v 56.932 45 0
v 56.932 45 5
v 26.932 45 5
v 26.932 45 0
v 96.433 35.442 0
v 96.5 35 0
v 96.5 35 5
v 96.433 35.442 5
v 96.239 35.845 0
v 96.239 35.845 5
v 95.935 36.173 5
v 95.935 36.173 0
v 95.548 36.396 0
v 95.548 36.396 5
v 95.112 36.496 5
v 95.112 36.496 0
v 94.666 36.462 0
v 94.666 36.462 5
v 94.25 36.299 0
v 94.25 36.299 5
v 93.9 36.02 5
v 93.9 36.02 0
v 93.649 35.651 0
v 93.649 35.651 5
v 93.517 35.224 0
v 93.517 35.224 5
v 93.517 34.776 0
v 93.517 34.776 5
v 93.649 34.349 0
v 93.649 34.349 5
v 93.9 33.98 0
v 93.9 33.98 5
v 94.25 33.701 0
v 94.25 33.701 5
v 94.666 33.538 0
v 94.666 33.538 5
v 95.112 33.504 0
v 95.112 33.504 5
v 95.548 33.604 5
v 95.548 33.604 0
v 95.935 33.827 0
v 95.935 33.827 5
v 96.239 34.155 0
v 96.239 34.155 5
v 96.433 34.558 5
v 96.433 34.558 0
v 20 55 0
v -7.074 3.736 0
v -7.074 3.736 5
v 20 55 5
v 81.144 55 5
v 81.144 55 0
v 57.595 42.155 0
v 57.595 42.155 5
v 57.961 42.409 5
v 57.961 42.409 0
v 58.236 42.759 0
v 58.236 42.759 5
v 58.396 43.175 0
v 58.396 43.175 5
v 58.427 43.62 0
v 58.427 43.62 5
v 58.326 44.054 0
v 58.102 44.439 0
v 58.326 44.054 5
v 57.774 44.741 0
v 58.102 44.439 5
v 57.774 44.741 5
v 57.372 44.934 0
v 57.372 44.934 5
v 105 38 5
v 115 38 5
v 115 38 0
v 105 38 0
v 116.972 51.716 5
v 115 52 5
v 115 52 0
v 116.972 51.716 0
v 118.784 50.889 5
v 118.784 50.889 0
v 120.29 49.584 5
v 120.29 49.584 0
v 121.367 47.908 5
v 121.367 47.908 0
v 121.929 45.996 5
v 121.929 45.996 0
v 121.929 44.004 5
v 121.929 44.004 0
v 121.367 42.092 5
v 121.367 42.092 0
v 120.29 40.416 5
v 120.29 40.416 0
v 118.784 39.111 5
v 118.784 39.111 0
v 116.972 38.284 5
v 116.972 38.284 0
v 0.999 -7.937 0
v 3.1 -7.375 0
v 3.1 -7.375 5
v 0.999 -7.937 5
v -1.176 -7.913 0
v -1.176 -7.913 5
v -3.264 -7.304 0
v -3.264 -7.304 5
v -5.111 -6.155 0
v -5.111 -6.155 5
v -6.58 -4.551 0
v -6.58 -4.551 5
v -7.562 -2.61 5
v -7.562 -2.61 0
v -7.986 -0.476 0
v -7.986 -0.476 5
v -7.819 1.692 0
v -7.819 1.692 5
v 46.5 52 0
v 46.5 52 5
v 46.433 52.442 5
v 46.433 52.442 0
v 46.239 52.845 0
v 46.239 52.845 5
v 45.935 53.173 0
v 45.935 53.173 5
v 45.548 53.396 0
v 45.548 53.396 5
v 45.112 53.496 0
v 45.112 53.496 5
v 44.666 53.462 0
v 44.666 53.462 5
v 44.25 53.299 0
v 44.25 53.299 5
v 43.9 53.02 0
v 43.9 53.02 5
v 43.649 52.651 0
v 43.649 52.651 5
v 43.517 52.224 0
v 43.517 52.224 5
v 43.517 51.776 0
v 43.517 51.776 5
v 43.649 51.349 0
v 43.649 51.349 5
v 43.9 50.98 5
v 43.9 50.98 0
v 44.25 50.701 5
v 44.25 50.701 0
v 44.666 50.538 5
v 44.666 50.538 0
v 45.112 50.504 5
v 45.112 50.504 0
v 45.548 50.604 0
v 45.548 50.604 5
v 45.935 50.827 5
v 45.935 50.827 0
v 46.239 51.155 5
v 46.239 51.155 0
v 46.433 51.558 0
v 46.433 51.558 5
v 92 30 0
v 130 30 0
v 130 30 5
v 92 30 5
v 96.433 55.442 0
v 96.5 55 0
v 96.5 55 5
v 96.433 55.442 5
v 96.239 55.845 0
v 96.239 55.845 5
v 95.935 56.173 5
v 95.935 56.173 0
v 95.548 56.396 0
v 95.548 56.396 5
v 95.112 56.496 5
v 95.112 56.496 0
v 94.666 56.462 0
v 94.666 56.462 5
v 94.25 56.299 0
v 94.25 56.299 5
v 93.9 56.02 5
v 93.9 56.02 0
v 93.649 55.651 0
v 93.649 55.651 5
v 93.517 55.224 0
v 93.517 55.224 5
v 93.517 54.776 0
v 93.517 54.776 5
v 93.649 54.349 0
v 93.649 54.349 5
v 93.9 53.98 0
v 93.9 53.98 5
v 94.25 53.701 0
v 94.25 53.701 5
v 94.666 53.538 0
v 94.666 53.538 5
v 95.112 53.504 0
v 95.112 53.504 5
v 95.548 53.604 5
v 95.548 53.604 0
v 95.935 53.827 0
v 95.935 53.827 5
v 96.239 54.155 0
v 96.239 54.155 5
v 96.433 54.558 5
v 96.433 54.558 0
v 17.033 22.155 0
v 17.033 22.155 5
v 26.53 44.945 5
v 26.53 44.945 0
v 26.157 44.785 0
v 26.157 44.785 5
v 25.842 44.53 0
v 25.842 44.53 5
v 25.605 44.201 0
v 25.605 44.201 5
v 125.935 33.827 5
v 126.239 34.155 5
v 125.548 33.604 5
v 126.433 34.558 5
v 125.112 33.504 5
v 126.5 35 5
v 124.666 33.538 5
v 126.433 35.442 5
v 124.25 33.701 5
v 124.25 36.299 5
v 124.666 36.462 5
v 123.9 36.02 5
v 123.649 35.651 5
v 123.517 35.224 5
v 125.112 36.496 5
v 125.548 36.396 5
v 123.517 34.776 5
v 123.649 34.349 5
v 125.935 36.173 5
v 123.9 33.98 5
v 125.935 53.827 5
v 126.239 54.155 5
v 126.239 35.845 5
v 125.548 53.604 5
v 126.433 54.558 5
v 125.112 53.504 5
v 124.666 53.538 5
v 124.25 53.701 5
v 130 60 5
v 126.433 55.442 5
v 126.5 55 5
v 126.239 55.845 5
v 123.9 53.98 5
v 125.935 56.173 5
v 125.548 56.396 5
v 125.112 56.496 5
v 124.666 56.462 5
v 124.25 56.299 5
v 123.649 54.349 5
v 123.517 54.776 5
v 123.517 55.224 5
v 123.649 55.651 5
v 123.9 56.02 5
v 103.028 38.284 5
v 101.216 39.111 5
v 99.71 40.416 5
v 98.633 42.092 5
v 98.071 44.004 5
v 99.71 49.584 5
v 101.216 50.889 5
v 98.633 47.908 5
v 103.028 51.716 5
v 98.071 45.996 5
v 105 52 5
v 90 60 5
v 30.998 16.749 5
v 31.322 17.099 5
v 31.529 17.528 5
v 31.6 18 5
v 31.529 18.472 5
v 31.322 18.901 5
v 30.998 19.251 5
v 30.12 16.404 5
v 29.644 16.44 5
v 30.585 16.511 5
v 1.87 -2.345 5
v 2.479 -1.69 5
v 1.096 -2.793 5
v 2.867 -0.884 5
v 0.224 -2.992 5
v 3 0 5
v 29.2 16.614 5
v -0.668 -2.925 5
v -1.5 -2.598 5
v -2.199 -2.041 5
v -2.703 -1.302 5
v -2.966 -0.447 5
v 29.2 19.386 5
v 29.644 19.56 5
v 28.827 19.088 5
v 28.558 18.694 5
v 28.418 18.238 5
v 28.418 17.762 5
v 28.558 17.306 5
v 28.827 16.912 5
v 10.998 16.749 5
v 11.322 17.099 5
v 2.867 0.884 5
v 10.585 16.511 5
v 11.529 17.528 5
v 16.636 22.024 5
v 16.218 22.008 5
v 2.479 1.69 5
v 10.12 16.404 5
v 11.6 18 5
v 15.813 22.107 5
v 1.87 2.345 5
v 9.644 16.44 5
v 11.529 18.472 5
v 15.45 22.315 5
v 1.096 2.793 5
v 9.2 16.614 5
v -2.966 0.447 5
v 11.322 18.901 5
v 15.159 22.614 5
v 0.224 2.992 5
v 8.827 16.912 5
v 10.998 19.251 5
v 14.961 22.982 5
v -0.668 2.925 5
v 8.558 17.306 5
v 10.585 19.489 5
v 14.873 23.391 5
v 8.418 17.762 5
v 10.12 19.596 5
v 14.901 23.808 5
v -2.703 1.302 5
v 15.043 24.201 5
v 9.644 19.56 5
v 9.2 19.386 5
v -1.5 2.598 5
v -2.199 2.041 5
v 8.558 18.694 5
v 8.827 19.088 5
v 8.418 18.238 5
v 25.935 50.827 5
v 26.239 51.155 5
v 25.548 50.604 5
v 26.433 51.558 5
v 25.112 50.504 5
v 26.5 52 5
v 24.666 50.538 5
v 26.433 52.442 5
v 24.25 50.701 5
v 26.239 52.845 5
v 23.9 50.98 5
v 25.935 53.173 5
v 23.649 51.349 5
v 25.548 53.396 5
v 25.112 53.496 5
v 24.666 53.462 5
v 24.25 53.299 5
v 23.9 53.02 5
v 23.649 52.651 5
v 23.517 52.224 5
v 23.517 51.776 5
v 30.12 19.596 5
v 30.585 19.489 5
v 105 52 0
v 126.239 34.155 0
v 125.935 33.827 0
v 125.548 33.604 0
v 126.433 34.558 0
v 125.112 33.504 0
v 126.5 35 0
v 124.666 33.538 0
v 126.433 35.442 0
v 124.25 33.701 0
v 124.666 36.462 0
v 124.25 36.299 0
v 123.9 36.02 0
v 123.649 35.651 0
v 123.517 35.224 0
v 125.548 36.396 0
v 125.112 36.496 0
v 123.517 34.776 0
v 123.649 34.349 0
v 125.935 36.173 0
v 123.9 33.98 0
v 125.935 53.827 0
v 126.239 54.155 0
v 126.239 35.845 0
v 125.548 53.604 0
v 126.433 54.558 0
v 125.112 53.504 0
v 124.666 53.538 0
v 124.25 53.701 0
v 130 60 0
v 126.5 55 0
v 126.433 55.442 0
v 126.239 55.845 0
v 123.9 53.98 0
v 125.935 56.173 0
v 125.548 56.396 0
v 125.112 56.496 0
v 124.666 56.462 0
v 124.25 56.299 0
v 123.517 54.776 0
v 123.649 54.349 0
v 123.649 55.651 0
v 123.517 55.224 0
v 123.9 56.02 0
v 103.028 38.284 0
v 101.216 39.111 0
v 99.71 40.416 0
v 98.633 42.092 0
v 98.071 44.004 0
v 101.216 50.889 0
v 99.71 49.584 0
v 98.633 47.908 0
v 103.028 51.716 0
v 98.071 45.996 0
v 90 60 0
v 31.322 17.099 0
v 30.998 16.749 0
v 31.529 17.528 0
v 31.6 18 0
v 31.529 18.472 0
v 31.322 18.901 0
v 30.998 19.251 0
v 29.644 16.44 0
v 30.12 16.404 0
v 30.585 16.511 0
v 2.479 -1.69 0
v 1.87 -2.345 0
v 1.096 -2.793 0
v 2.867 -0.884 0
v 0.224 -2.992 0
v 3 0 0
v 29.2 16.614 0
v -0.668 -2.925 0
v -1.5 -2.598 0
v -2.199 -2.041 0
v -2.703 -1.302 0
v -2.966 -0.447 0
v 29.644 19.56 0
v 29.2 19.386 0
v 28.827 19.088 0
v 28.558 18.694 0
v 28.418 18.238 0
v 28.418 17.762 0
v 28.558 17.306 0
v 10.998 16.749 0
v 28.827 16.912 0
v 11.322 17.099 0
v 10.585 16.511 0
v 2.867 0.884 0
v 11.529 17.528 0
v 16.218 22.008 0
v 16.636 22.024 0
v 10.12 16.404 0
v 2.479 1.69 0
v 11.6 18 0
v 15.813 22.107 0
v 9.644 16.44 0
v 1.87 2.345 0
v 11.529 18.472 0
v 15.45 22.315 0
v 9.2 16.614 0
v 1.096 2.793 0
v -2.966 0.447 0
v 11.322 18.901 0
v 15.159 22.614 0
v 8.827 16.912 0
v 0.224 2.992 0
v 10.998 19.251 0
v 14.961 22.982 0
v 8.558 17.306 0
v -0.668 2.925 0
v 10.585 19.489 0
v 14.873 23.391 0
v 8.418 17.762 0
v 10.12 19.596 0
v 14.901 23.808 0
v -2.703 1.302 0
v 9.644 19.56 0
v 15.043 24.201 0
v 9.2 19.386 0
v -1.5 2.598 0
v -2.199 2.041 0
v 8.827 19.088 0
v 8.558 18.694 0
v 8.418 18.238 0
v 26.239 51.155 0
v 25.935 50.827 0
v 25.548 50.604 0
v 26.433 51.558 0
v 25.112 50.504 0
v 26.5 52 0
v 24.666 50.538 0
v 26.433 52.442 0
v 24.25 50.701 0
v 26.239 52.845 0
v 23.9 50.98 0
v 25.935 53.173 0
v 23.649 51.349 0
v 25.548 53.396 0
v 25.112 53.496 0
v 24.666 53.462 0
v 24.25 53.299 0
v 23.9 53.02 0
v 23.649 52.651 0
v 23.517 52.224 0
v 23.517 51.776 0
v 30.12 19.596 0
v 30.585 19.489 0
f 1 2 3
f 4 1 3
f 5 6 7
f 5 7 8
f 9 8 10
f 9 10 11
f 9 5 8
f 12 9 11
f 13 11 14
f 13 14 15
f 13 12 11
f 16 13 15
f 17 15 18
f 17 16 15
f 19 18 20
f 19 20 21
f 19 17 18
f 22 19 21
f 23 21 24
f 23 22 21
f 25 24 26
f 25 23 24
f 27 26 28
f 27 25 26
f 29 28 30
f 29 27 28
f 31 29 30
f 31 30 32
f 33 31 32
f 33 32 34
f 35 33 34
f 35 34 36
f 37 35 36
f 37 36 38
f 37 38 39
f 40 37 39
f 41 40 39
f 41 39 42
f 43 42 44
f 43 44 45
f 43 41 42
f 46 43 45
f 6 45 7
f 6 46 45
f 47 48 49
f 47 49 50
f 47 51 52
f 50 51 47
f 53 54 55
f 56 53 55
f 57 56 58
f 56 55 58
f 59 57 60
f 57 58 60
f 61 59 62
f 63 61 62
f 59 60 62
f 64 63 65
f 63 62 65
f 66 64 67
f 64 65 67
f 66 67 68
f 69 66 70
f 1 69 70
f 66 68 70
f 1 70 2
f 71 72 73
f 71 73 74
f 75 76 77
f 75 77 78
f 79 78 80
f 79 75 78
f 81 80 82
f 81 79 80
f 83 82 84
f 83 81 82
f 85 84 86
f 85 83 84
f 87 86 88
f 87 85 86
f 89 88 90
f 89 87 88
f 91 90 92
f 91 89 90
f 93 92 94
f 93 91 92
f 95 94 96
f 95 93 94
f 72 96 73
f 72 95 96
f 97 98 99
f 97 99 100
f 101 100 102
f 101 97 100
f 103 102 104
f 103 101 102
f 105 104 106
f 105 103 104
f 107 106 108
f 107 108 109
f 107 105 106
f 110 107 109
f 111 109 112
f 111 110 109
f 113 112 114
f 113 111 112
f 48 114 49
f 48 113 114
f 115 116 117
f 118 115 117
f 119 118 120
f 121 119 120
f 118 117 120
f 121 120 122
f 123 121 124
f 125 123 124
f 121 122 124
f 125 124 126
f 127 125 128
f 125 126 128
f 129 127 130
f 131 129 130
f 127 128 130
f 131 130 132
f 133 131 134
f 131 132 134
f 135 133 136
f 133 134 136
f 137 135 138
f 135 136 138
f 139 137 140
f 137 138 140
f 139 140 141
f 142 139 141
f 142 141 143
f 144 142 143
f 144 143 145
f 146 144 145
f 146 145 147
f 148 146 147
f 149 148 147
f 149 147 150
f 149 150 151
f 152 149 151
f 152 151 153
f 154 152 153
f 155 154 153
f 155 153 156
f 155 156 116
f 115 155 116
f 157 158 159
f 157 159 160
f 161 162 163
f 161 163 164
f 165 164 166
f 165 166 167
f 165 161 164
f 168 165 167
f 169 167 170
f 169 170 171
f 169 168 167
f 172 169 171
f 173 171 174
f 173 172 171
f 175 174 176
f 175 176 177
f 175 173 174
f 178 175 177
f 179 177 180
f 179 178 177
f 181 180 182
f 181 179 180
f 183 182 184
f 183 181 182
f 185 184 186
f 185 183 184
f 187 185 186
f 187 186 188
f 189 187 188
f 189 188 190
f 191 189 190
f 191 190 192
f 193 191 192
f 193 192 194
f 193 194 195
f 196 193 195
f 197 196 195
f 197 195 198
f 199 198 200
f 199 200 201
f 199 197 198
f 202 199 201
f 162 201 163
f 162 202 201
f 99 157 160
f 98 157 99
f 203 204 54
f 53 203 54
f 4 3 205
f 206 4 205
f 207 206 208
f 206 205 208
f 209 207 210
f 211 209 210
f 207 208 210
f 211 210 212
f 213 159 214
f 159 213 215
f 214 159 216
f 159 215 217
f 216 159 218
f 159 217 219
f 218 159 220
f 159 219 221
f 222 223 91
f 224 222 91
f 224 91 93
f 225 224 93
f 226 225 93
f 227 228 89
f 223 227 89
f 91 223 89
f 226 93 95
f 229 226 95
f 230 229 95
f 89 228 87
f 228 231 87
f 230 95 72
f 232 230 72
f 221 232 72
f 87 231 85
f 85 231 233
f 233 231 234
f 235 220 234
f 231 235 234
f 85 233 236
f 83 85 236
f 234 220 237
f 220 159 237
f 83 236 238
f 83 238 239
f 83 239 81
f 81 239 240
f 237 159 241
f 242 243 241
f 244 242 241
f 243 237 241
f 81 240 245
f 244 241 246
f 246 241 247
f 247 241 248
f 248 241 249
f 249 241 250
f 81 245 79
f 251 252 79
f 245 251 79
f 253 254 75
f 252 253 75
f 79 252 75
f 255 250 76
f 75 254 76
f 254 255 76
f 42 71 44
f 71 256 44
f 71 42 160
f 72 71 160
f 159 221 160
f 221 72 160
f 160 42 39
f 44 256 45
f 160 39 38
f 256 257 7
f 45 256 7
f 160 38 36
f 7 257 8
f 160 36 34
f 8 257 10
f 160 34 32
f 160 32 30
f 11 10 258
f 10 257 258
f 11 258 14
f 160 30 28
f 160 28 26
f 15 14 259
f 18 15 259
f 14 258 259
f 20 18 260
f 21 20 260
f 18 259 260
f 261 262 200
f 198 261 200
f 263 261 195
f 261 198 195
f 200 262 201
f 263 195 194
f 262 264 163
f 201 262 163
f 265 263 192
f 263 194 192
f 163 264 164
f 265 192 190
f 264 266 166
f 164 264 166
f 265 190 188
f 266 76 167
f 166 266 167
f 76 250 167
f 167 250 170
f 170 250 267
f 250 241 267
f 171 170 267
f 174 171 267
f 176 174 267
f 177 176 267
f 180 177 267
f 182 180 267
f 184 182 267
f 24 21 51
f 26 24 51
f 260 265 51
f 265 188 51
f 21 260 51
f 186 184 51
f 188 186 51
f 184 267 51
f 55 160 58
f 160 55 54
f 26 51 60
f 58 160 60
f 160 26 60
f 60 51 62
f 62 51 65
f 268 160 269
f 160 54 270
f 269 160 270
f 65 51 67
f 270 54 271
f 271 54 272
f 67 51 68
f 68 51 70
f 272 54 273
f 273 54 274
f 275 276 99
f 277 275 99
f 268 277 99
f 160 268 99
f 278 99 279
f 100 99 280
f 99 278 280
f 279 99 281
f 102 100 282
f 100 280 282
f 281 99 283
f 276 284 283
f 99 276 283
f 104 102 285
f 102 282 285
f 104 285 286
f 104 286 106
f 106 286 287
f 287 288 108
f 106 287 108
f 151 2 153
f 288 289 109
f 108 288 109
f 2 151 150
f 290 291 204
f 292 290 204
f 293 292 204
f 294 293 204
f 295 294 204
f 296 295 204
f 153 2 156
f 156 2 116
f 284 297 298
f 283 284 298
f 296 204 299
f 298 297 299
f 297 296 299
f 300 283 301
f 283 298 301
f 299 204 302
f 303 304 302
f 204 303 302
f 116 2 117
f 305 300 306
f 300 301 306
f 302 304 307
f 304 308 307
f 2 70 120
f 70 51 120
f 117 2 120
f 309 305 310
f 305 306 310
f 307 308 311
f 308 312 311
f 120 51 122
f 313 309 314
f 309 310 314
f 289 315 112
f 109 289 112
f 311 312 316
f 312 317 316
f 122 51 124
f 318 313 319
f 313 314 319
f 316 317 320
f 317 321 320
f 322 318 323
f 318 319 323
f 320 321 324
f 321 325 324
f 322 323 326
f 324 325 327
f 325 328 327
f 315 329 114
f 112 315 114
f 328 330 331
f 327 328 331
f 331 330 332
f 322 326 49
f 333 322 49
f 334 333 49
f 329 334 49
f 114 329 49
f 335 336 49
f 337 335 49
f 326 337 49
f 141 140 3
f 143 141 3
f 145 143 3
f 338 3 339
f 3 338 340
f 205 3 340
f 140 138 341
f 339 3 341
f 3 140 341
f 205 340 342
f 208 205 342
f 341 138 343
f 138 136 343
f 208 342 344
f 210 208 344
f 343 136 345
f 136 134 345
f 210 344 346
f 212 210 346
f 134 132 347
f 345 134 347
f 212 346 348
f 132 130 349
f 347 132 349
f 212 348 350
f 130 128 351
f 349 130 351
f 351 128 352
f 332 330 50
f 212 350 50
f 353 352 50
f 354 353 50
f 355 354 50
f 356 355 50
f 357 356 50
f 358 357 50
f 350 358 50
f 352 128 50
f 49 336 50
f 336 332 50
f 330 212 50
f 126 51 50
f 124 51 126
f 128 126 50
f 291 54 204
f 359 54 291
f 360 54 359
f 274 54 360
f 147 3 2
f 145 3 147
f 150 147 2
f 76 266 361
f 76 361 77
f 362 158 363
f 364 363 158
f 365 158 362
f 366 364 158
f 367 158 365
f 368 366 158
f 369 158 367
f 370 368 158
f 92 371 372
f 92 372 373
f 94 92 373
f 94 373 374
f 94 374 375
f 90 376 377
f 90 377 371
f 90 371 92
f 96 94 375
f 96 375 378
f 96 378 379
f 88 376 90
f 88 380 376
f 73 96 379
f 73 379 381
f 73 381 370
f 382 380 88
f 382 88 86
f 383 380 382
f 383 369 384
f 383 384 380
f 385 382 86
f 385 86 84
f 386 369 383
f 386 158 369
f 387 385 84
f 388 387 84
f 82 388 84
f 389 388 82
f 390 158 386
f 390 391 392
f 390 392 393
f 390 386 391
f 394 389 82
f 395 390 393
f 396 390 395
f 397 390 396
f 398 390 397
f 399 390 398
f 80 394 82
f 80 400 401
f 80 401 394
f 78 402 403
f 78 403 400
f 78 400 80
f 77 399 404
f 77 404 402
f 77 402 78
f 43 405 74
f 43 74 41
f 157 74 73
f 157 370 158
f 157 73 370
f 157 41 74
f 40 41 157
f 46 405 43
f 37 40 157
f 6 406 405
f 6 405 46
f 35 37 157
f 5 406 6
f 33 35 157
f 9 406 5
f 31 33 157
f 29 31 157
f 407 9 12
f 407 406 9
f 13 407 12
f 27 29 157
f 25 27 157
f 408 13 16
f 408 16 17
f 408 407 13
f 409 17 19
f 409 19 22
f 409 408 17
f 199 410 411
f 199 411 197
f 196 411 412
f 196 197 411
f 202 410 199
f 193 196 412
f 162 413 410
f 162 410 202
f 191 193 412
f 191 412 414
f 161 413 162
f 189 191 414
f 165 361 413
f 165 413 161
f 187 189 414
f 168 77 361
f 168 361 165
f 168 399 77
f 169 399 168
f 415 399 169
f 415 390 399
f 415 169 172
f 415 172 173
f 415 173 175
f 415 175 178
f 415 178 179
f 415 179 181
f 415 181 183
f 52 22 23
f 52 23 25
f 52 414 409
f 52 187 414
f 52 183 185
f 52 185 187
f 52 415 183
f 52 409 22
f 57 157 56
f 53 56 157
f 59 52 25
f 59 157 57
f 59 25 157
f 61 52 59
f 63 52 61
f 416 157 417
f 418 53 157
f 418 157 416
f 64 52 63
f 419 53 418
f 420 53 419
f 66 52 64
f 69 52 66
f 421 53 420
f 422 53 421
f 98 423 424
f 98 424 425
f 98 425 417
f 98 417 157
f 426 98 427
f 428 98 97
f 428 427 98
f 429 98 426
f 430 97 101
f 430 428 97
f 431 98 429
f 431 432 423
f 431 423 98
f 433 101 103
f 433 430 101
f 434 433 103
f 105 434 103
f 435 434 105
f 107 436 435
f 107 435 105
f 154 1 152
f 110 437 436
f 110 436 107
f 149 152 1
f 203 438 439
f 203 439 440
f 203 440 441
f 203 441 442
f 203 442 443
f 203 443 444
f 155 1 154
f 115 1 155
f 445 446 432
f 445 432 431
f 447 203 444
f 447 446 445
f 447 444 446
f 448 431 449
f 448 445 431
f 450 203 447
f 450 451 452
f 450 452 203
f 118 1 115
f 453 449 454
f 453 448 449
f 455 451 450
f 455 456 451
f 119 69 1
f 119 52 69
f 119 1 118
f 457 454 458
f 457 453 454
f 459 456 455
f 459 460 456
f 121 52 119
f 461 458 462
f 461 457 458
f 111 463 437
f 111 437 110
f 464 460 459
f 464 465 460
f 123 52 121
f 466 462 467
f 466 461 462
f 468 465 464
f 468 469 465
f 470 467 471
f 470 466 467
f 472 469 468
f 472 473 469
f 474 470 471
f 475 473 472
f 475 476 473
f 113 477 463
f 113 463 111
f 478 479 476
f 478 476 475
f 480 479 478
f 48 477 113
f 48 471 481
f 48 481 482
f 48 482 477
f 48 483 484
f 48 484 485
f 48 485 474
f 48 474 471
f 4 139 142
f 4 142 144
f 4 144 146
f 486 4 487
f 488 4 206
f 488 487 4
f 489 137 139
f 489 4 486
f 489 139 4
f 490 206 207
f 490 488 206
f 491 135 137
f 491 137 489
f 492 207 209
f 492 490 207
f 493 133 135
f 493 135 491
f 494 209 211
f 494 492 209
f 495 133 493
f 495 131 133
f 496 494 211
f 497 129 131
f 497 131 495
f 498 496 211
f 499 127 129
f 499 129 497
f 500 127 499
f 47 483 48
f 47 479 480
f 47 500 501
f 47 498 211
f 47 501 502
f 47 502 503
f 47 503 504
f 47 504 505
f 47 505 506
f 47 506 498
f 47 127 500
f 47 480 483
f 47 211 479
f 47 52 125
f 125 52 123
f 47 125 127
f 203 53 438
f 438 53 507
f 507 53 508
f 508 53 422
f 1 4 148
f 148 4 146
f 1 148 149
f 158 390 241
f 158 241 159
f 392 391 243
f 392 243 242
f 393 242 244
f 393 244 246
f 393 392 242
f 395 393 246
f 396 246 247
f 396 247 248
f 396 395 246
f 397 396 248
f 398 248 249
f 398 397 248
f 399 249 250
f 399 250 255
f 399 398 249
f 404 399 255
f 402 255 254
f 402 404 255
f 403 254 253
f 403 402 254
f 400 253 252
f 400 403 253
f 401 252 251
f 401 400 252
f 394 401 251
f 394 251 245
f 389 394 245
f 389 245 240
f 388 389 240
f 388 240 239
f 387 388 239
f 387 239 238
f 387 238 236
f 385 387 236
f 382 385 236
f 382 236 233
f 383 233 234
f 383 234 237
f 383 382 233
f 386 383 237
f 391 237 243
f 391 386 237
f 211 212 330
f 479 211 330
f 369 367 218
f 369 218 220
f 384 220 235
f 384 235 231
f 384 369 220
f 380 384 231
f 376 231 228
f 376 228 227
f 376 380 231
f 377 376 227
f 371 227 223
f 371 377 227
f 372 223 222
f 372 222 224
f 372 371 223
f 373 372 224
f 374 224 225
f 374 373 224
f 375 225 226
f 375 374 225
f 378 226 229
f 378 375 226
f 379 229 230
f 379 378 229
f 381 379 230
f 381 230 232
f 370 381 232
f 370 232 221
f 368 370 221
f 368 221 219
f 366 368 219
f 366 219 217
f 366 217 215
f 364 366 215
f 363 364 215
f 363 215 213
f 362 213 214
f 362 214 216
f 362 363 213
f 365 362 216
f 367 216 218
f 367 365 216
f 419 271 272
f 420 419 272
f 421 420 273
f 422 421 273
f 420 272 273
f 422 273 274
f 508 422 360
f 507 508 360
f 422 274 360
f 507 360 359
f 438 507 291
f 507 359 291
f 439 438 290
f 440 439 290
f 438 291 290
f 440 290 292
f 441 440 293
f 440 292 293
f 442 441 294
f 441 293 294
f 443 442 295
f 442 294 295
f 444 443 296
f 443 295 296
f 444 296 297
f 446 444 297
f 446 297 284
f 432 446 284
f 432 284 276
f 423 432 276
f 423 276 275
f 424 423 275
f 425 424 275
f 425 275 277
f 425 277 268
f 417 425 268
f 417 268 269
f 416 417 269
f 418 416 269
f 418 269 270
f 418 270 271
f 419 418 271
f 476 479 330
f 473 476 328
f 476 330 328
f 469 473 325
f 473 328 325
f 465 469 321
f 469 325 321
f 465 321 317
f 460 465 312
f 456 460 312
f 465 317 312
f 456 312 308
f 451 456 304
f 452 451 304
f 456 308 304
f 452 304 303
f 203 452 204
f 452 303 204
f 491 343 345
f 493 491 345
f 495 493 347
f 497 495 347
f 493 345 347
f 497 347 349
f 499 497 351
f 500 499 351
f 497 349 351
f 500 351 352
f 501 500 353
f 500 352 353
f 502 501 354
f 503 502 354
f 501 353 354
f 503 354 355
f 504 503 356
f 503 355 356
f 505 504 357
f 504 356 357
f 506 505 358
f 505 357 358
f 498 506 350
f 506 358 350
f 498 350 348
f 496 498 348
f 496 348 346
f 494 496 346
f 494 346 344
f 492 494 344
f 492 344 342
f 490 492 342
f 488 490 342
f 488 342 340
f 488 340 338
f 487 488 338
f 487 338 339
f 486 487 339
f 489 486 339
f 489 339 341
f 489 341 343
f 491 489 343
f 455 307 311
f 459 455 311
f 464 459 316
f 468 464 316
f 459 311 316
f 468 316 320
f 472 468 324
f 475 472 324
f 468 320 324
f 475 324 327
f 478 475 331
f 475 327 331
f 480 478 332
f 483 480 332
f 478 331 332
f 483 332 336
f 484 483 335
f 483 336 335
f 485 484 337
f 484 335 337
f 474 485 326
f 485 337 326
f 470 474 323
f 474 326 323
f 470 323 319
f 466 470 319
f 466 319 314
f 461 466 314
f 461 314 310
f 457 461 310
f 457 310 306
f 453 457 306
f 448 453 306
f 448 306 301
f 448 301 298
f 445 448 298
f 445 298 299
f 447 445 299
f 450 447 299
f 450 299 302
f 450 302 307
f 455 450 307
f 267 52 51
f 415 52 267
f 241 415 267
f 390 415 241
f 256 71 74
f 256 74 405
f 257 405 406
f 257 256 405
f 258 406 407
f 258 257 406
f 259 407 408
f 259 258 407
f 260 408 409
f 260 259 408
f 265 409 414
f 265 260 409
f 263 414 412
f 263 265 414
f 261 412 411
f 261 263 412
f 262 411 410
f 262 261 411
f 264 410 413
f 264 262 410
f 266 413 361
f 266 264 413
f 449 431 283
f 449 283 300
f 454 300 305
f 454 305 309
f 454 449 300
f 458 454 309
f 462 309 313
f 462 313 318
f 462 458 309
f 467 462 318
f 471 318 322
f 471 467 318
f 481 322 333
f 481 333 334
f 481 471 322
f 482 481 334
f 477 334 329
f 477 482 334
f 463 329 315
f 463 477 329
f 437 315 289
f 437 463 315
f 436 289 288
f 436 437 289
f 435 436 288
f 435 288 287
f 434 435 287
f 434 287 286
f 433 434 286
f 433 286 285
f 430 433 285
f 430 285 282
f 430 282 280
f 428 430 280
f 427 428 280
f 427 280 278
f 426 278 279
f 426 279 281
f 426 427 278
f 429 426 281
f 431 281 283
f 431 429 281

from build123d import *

# Parameters (mm, degrees)
SKETCH_1_R          = 3
SKETCH_1_R_2        = 1.5
EXTRUDE_1_DEPTH     = 5
EXTRUDE_2_DEPTH     = 5
SKETCH_4_R          = 1.5
CUT_EXTRUDE_1_DEPTH = 144.265487819
EXTRUDE_START       = -5
EXTRUDE_3_DEPTH     = 5
CUT_EXTRUDE_2_DEPTH = 144.265487819
SKETCH_7_R          = 1.6
CUT_EXTRUDE_3_DEPTH = 144.265487819


with BuildPart() as part:
    # 草图1 → 凸台-拉伸1 (new body)
    with BuildSketch(Plane.XY):
        with BuildLine():
            Line((-3.933140204, 6.966376973), (90, 60))
            Line((90, 60), (130, 60))
            Line((130, 60), (130, 30))
            Line((130, 30), (92, 30))
            Line((92, 30), (3.100465808, -7.374761811))
            ThreePointArc((3.100465808, -7.374761811), (-7.182645896, -3.522725923), (-3.933140204, 6.966376973))
        make_face()
        Circle(SKETCH_1_R, mode=Mode.SUBTRACT)
        with Locations((95, 55)):
            Circle(SKETCH_1_R_2, mode=Mode.SUBTRACT)
        with Locations((125, 55)):
            Circle(SKETCH_1_R_2, mode=Mode.SUBTRACT)
        with Locations((125, 35)):
            Circle(SKETCH_1_R_2, mode=Mode.SUBTRACT)
        with Locations((95, 35)):
            Circle(SKETCH_1_R_2, mode=Mode.SUBTRACT)
    extrude(amount=EXTRUDE_1_DEPTH)

    # 草图3 → 凸台-拉伸2 (add)
    with BuildSketch(Plane.XY.offset(5)):
        Polygon((81.144001216, 55), (20, 55), (20, 20.478766027), align=None)
    extrude(amount=-EXTRUDE_2_DEPTH)

    # 草图4 → 切除-拉伸1 (cut, through all)
    with BuildSketch(Plane.XY.offset(5)):
        with Locations((25, 52)):
            Circle(SKETCH_4_R)
        with Locations((45, 52)):
            Circle(SKETCH_4_R)
    extrude(amount=-CUT_EXTRUDE_1_DEPTH, mode=Mode.SUBTRACT)

    # 草图6 → 凸台-拉伸3 (add)
    with BuildSketch(Plane.XY.offset(5).offset(EXTRUDE_START)):
        with BuildLine():
            Line((-7.074049095, 3.736017853), (20, 55))
            Line((20, 55), (20, 20.478766027))
            Line((20, 20.478766027), (-3.933140204, 6.966376973))
            ThreePointArc((-3.933140204, 6.966376973), (-5.735709118, 5.576884517), (-7.074049095, 3.736017853))
        make_face()
    extrude(amount=EXTRUDE_3_DEPTH)

    # 草图5 → 切除-拉伸2 (cut, through all)
    with BuildSketch(Plane.XY.offset(5)):
        with BuildLine():
            Line((105, 52), (115, 52))
            ThreePointArc((115, 52), (122, 45), (115, 38))
            Line((115, 38), (105, 38))
            ThreePointArc((105, 38), (98, 45), (105, 52))
        make_face()
        with BuildLine():
            Line((25.605401824, 44.200503347), (15.042800964, 24.200503347))
            ThreePointArc((15.042800964, 24.200503347), (15.293877797, 22.454192152), (17.032531201, 22.154647985))
            Line((17.032531201, 22.154647985), (57.595132061, 42.154647985))
            ThreePointArc((57.595132061, 42.154647985), (58.392612512, 43.840567158), (56.93178603, 45))
            Line((56.93178603, 45), (26.93178603, 45))
            ThreePointArc((26.93178603, 45), (26.157433081, 44.784670195), (25.605401824, 44.200503347))
        make_face()
    extrude(amount=-CUT_EXTRUDE_2_DEPTH, mode=Mode.SUBTRACT)

    # 草图7 → 切除-拉伸3 (cut, through all)
    with BuildSketch(Plane.XY.offset(5)):
        with Locations((10, 18)):
            Circle(SKETCH_7_R)
        with Locations((30, 18)):
            Circle(SKETCH_7_R)
    extrude(amount=-CUT_EXTRUDE_3_DEPTH, mode=Mode.SUBTRACT)


solid = part.part
